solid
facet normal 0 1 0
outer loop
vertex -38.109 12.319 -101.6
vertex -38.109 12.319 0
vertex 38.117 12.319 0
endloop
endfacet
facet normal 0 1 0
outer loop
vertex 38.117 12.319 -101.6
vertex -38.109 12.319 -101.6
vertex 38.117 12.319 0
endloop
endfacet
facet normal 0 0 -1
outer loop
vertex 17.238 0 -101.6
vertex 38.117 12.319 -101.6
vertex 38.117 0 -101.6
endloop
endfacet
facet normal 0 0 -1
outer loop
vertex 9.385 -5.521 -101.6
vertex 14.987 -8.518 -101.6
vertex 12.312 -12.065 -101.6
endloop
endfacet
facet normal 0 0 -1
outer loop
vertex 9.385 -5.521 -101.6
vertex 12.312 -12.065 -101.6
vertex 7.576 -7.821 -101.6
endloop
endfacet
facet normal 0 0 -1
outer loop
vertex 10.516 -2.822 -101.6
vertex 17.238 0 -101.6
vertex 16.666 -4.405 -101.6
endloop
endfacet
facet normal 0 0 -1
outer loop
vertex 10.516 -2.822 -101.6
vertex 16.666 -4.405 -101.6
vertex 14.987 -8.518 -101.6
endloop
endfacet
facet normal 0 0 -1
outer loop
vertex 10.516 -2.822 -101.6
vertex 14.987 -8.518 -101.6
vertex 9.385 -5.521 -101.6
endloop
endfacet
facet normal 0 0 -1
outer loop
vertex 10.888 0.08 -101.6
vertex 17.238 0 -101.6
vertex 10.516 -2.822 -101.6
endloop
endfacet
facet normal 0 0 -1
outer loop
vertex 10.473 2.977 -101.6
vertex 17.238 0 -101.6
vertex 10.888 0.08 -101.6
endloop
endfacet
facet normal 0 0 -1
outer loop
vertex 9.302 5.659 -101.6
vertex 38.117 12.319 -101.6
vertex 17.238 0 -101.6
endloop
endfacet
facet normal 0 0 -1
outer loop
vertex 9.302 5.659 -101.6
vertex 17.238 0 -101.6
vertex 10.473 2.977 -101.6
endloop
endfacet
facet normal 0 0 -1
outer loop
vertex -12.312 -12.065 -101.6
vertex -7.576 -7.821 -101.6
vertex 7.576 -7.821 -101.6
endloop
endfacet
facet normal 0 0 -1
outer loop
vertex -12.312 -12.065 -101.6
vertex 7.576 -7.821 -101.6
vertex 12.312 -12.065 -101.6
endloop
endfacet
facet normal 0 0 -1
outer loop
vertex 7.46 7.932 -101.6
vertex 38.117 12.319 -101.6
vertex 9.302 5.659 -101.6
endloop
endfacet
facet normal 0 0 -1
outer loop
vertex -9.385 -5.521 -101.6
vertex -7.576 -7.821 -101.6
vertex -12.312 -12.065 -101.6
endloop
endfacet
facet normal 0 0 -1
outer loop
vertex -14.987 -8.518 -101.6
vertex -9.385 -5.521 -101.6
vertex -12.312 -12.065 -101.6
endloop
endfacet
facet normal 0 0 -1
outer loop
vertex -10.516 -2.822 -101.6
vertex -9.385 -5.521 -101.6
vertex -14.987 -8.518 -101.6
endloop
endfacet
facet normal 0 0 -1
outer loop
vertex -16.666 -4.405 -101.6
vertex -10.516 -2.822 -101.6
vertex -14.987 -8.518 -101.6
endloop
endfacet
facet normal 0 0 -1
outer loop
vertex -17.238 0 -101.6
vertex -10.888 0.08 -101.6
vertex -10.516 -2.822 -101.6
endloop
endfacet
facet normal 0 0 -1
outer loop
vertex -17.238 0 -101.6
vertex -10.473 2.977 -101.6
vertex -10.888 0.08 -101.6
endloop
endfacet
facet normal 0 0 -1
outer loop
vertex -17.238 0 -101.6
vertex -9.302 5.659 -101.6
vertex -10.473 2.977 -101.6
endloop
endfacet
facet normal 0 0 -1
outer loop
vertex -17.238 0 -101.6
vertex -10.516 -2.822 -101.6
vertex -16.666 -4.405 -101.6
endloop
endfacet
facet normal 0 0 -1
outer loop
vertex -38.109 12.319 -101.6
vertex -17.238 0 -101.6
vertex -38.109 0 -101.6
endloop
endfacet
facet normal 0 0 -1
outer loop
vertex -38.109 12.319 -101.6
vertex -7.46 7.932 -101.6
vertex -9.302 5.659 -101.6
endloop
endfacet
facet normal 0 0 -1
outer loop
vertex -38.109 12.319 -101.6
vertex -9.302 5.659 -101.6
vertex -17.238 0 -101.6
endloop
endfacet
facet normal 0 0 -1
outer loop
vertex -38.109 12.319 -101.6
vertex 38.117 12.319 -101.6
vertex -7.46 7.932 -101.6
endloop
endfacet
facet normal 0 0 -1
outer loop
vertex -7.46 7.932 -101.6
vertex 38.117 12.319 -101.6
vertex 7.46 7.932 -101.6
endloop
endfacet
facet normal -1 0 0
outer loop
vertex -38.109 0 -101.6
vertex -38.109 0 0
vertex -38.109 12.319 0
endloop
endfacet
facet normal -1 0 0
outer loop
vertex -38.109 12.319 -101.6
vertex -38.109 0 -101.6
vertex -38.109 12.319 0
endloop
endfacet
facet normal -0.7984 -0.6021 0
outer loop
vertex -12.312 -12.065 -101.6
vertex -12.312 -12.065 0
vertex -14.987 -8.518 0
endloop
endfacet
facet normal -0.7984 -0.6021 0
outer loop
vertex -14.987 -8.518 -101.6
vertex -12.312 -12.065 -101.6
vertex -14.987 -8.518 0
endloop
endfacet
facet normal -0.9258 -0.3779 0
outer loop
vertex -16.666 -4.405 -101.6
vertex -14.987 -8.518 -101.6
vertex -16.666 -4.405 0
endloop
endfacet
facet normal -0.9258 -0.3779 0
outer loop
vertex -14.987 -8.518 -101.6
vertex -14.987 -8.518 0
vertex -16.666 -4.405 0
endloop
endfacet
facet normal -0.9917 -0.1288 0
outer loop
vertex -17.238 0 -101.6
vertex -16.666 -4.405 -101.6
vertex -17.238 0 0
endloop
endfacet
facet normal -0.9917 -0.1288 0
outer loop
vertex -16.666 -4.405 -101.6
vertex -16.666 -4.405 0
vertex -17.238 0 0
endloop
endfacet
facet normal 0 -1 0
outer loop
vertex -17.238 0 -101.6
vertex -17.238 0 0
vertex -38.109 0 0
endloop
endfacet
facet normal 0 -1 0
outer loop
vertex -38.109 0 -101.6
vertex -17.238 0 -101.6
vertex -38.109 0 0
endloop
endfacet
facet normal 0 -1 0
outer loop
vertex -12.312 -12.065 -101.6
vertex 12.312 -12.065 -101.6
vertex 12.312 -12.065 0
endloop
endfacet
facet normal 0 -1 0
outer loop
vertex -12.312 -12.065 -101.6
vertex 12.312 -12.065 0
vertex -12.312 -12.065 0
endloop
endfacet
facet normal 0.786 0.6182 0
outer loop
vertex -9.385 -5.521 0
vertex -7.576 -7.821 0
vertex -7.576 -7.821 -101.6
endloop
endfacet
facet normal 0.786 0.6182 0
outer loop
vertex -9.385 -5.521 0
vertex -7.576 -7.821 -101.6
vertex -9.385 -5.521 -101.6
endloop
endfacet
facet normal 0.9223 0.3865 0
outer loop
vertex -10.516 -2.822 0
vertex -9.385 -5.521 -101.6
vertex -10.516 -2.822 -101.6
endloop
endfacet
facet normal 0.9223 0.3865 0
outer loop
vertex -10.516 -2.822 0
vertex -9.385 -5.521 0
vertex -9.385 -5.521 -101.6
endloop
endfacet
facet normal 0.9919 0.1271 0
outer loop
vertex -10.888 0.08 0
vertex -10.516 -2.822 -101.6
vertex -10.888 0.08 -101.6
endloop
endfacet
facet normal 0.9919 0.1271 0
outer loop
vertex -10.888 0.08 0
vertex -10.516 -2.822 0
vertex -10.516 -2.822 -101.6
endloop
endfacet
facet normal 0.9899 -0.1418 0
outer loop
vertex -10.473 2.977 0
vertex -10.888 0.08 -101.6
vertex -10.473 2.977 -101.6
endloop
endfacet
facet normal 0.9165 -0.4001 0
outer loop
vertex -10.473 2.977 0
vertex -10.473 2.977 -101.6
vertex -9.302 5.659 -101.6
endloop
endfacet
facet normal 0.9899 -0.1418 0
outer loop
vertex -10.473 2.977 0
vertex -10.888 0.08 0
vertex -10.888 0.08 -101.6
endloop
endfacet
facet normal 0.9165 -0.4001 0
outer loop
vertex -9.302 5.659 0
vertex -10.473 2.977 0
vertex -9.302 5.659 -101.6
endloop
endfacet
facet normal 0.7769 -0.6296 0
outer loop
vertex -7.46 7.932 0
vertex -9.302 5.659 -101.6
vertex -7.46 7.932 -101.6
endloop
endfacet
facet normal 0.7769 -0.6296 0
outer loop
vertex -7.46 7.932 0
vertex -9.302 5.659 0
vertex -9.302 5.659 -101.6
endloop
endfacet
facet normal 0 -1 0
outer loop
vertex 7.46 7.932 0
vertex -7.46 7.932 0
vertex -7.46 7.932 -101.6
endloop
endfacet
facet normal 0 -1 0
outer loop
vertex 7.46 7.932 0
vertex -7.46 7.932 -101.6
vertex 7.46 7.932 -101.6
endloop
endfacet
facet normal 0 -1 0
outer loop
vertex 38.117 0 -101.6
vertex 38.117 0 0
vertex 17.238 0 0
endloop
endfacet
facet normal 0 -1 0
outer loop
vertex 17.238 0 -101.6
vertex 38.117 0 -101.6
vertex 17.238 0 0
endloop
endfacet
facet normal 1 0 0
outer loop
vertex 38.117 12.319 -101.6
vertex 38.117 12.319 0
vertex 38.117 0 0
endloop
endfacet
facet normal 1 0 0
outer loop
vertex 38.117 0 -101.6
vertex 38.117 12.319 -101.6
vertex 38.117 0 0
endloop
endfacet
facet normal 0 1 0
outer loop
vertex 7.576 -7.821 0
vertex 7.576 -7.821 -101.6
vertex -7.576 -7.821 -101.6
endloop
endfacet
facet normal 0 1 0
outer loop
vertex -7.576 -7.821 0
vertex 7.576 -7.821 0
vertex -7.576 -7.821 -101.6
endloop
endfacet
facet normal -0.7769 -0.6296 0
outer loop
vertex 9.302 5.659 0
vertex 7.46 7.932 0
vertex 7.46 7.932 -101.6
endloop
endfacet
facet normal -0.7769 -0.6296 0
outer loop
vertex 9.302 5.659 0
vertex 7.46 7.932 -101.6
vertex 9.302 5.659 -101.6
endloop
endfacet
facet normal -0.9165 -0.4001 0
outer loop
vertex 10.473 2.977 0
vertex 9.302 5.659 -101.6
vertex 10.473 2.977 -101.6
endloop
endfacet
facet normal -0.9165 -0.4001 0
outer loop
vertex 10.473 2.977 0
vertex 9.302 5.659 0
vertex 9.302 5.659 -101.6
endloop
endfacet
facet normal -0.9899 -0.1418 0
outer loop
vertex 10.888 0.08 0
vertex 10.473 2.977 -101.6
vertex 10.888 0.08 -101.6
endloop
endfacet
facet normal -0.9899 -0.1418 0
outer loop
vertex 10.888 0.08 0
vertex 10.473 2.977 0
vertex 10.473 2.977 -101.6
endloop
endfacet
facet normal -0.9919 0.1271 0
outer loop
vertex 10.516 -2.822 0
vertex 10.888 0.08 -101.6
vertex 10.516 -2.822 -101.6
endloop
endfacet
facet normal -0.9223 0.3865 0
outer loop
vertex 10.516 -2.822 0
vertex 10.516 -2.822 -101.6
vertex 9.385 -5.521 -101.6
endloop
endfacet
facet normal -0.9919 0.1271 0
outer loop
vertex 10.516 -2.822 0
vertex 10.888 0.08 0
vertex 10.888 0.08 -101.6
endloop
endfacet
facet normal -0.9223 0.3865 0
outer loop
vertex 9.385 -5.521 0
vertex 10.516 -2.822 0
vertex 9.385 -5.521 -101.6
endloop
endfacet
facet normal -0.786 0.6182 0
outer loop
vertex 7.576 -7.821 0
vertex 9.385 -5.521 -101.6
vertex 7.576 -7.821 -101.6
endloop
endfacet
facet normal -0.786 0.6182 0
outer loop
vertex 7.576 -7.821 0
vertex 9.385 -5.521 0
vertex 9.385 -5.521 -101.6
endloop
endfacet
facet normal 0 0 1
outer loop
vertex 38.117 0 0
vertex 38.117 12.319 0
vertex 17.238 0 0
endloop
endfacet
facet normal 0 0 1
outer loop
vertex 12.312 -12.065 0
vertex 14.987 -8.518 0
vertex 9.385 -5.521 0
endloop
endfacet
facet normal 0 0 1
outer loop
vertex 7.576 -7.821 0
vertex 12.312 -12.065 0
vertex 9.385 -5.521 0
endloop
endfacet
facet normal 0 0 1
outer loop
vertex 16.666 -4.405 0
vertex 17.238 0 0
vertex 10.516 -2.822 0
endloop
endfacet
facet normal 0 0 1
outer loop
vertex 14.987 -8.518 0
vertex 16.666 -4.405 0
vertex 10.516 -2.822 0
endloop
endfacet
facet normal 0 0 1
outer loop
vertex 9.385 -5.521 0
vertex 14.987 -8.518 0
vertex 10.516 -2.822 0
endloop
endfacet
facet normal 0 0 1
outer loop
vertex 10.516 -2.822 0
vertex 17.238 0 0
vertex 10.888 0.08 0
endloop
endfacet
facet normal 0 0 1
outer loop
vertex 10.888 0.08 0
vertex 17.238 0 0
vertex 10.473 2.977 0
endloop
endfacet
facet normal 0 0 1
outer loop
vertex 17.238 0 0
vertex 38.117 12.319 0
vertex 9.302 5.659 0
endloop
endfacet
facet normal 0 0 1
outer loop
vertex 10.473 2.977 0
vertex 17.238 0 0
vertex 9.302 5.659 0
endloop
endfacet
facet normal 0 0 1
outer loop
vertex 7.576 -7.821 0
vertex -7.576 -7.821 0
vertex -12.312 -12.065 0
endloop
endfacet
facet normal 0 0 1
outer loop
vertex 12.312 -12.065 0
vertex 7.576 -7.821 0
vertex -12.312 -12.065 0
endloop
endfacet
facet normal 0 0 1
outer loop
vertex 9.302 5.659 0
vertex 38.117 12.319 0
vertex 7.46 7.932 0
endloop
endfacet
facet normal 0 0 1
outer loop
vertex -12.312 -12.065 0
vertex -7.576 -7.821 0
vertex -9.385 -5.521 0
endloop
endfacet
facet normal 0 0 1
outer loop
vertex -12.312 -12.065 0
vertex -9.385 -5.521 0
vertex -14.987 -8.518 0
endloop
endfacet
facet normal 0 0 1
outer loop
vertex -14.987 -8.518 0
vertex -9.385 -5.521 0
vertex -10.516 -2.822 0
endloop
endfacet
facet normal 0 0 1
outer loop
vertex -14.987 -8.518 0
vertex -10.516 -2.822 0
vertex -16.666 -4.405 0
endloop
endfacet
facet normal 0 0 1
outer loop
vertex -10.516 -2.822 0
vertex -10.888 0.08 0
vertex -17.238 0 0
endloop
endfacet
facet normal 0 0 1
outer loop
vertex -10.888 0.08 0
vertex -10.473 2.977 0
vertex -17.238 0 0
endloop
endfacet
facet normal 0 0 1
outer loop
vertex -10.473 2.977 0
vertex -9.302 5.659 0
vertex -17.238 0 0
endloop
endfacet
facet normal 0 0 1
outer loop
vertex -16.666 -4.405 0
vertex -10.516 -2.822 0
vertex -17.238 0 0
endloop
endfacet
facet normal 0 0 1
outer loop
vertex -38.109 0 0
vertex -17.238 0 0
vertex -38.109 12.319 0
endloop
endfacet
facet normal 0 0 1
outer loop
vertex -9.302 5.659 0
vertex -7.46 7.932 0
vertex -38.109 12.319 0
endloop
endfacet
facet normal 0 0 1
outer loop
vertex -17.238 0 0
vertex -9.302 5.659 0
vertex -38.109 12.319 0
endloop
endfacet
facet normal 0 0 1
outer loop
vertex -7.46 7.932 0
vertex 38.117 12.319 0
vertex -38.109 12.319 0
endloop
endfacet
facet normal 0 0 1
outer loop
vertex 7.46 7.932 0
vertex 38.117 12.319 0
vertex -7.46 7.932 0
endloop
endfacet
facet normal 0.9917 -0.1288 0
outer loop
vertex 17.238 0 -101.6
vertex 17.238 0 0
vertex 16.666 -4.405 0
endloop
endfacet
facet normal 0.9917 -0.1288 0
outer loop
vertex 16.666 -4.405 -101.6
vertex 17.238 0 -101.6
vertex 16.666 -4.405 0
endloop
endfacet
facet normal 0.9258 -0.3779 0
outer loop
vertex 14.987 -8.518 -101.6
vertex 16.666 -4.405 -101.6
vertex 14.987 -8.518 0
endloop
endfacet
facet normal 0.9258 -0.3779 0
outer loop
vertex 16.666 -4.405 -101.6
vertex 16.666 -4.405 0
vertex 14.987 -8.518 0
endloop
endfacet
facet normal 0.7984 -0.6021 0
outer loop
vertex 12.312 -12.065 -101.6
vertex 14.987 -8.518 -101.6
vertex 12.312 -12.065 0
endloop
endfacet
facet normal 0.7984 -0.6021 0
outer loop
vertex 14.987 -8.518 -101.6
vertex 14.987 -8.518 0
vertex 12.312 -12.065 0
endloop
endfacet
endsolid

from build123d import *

# Parameters (mm, degrees)
BOSS_EXTRUDE1_DEPTH = 101.6


with BuildPart() as part:
    # Sketch1 → Boss-Extrude1 (new body)
    with BuildSketch(Plane.XY):
        with BuildLine():
            Line((-38.109310446, 0), (-38.109310446, 12.319))
            Line((-38.109310446, 12.319), (38.11716556, 12.319))
            Line((38.11716556, 12.319), (38.11716556, 0))
            Line((38.11716556, 0), (17.238227932, 0))
            ThreePointArc((17.238227932, 0), (15.959298514, -6.515926117), (12.312281561, -12.065))
            Line((12.312281561, -12.065), (12.05814004, -12.065))
            Line((12.05814004, -12.065), (-12.05814004, -12.065))
            Line((-12.05814004, -12.065), (-12.312281561, -12.065))
            ThreePointArc((-12.312281561, -12.065), (-15.959298514, -6.515926117), (-17.238227932, 0))
            Line((-17.238227932, 0), (-38.109310446, 0))
        make_face()
        with BuildLine():
            Line((-7.459501807, 7.931540852), (7.459501807, 7.931540852))
            ThreePointArc((7.459501807, 7.931540852), (10.887932539, 0.08020301), (7.575537086, -7.820789305))
            Line((7.575537086, -7.820789305), (-7.575537086, -7.820789305))
            ThreePointArc((-7.575537086, -7.820789305), (-10.887932539, 0.08020301), (-7.459501807, 7.931540852))
        make_face(mode=Mode.SUBTRACT)
    extrude(amount=-BOSS_EXTRUDE1_DEPTH)


solid = part.part
